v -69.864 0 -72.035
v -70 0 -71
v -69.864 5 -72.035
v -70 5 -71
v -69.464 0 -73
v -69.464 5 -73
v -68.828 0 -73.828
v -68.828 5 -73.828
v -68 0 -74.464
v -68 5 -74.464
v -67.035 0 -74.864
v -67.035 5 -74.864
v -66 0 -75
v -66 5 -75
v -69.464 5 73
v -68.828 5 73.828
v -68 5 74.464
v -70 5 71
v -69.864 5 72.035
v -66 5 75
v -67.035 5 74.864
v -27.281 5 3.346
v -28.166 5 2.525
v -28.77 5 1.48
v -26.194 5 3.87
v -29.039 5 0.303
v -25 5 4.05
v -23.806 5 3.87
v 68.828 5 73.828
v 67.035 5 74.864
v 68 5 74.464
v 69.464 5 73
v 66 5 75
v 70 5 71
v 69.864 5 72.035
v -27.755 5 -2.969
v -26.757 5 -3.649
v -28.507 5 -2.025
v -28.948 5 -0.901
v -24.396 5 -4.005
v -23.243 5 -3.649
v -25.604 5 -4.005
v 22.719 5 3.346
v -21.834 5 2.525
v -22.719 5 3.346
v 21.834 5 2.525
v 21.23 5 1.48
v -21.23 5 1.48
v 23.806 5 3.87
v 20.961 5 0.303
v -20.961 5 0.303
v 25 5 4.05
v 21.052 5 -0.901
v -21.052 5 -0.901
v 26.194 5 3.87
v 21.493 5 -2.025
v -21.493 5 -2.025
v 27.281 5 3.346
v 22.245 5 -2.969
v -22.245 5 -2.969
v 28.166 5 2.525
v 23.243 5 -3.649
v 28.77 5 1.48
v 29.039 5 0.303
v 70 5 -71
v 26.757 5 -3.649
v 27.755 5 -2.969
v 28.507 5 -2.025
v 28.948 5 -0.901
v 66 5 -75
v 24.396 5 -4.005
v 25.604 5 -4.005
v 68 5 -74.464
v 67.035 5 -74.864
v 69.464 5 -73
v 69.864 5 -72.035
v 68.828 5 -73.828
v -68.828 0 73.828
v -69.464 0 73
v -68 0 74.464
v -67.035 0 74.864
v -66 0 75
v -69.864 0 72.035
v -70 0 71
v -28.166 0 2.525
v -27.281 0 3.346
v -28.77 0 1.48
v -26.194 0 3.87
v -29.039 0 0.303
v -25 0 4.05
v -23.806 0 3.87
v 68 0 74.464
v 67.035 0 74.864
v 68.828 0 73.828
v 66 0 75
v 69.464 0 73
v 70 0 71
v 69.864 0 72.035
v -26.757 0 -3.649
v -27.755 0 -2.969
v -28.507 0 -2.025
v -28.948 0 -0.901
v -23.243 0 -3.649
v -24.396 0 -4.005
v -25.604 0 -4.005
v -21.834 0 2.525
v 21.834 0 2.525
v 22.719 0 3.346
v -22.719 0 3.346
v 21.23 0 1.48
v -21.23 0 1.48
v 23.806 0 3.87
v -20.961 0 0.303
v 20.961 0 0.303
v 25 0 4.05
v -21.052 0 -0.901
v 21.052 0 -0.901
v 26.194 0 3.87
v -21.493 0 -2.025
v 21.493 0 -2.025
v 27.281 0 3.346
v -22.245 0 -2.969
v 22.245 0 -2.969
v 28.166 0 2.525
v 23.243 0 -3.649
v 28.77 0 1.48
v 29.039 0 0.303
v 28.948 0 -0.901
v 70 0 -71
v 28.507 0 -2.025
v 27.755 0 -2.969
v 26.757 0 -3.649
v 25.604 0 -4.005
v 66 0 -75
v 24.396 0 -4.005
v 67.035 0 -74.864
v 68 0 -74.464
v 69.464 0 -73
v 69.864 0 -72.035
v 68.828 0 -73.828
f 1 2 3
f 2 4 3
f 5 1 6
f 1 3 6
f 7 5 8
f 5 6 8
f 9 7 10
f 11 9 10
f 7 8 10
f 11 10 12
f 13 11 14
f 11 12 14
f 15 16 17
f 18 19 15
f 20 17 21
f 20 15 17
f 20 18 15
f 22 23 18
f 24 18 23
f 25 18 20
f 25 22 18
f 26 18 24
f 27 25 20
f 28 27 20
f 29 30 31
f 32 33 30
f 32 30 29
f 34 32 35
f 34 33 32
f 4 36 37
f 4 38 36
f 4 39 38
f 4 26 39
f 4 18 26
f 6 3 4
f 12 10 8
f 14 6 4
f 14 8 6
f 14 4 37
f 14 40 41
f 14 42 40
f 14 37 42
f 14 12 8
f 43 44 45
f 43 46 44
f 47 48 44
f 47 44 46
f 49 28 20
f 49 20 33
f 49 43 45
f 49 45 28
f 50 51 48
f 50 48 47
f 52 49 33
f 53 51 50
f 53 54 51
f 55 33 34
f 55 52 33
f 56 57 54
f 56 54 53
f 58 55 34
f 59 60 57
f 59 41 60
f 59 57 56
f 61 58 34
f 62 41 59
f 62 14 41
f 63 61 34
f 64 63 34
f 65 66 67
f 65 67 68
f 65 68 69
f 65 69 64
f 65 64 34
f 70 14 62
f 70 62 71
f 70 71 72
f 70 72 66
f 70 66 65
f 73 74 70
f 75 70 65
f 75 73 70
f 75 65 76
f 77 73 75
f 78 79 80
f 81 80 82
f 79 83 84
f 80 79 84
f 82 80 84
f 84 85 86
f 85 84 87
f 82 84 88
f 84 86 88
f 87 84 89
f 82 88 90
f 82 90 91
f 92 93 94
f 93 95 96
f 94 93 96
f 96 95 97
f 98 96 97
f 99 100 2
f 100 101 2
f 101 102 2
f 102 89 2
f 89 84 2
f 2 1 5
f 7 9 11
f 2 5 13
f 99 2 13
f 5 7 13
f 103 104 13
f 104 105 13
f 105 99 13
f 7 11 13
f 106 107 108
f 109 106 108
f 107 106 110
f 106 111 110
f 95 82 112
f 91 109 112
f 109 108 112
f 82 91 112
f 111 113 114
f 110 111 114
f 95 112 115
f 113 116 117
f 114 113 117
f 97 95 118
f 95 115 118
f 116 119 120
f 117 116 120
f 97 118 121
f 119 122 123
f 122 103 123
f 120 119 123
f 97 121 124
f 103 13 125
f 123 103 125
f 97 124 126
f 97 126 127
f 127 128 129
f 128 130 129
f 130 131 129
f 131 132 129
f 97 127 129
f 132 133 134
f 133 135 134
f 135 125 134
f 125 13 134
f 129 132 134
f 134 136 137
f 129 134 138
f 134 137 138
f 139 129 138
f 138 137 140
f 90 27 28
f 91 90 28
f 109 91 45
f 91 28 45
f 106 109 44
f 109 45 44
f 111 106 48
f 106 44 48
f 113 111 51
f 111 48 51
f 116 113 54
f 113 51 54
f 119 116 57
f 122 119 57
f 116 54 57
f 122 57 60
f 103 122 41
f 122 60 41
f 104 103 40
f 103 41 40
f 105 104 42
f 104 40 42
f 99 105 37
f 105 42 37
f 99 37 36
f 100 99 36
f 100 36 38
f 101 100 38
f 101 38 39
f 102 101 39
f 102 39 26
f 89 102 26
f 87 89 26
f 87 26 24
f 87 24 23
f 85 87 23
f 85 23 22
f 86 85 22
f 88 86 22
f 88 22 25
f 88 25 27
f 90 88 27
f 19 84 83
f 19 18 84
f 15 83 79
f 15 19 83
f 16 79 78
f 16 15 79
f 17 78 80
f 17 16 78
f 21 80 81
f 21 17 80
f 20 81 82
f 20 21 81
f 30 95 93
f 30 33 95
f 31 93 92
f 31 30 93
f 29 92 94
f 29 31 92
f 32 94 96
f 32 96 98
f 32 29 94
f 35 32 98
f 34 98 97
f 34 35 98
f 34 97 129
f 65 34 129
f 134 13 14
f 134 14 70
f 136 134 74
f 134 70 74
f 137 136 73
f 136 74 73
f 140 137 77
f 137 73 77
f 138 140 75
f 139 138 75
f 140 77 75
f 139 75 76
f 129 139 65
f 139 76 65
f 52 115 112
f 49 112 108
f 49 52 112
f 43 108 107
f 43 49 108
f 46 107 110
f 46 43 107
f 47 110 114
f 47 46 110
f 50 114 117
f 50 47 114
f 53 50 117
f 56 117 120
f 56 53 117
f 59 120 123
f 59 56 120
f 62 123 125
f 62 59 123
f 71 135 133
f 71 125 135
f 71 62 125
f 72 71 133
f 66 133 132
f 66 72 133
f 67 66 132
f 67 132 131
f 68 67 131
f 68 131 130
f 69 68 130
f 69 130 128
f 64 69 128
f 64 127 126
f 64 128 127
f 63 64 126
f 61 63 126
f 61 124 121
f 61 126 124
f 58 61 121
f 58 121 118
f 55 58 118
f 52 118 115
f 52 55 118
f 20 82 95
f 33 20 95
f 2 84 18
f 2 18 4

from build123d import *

# Parameters (mm, degrees)
SKETCH1_W           = 140
SKETCH1_H           = 150
BOSS_EXTRUDE1_DEPTH = 5
SKETCH2_R           = 4.05
CUT_EXTRUDE1_DEPTH  = 103.713192921
FILLET1_R           = 4


with BuildPart() as part:
    # Sketch1 → Boss-Extrude1 (new body)
    with BuildSketch(Plane(origin=(0, 0, 0), x_dir=(1, 0, 0), z_dir=(0, 1, 0))):
        Rectangle(SKETCH1_W, SKETCH1_H)
    extrude(amount=BOSS_EXTRUDE1_DEPTH)

    # Sketch2 → Cut-Extrude1 (cut, through all)
    with BuildSketch(Plane(origin=(0, 5, 0), x_dir=(1, 0, 0), z_dir=(0, 1, 0))):
        with Locations(Location((-25, 0, 0), (0, 0, 270))):
            Circle(SKETCH2_R)
    cut_extrude1 = extrude(amount=-CUT_EXTRUDE1_DEPTH, mode=Mode.SUBTRACT)

    # Mirror1: Cut-Extrude1 across plane
    add(cut_extrude1.mirror(Plane(origin=(0, 0, 0), x_dir=(0, 0, 1), z_dir=(1, 0, 0))), mode=Mode.SUBTRACT)

    # Fillet1
    fillet1_edges = [part.edges().sort_by_distance(p)[0] for p in [
        (70, 2.5, 75),
        (-70, 2.5, 75),
        (-70, 2.5, -75),
        (70, 2.5, -75),
    ]]
    fillet(fillet1_edges, radius=FILLET1_R)


solid = part.part
